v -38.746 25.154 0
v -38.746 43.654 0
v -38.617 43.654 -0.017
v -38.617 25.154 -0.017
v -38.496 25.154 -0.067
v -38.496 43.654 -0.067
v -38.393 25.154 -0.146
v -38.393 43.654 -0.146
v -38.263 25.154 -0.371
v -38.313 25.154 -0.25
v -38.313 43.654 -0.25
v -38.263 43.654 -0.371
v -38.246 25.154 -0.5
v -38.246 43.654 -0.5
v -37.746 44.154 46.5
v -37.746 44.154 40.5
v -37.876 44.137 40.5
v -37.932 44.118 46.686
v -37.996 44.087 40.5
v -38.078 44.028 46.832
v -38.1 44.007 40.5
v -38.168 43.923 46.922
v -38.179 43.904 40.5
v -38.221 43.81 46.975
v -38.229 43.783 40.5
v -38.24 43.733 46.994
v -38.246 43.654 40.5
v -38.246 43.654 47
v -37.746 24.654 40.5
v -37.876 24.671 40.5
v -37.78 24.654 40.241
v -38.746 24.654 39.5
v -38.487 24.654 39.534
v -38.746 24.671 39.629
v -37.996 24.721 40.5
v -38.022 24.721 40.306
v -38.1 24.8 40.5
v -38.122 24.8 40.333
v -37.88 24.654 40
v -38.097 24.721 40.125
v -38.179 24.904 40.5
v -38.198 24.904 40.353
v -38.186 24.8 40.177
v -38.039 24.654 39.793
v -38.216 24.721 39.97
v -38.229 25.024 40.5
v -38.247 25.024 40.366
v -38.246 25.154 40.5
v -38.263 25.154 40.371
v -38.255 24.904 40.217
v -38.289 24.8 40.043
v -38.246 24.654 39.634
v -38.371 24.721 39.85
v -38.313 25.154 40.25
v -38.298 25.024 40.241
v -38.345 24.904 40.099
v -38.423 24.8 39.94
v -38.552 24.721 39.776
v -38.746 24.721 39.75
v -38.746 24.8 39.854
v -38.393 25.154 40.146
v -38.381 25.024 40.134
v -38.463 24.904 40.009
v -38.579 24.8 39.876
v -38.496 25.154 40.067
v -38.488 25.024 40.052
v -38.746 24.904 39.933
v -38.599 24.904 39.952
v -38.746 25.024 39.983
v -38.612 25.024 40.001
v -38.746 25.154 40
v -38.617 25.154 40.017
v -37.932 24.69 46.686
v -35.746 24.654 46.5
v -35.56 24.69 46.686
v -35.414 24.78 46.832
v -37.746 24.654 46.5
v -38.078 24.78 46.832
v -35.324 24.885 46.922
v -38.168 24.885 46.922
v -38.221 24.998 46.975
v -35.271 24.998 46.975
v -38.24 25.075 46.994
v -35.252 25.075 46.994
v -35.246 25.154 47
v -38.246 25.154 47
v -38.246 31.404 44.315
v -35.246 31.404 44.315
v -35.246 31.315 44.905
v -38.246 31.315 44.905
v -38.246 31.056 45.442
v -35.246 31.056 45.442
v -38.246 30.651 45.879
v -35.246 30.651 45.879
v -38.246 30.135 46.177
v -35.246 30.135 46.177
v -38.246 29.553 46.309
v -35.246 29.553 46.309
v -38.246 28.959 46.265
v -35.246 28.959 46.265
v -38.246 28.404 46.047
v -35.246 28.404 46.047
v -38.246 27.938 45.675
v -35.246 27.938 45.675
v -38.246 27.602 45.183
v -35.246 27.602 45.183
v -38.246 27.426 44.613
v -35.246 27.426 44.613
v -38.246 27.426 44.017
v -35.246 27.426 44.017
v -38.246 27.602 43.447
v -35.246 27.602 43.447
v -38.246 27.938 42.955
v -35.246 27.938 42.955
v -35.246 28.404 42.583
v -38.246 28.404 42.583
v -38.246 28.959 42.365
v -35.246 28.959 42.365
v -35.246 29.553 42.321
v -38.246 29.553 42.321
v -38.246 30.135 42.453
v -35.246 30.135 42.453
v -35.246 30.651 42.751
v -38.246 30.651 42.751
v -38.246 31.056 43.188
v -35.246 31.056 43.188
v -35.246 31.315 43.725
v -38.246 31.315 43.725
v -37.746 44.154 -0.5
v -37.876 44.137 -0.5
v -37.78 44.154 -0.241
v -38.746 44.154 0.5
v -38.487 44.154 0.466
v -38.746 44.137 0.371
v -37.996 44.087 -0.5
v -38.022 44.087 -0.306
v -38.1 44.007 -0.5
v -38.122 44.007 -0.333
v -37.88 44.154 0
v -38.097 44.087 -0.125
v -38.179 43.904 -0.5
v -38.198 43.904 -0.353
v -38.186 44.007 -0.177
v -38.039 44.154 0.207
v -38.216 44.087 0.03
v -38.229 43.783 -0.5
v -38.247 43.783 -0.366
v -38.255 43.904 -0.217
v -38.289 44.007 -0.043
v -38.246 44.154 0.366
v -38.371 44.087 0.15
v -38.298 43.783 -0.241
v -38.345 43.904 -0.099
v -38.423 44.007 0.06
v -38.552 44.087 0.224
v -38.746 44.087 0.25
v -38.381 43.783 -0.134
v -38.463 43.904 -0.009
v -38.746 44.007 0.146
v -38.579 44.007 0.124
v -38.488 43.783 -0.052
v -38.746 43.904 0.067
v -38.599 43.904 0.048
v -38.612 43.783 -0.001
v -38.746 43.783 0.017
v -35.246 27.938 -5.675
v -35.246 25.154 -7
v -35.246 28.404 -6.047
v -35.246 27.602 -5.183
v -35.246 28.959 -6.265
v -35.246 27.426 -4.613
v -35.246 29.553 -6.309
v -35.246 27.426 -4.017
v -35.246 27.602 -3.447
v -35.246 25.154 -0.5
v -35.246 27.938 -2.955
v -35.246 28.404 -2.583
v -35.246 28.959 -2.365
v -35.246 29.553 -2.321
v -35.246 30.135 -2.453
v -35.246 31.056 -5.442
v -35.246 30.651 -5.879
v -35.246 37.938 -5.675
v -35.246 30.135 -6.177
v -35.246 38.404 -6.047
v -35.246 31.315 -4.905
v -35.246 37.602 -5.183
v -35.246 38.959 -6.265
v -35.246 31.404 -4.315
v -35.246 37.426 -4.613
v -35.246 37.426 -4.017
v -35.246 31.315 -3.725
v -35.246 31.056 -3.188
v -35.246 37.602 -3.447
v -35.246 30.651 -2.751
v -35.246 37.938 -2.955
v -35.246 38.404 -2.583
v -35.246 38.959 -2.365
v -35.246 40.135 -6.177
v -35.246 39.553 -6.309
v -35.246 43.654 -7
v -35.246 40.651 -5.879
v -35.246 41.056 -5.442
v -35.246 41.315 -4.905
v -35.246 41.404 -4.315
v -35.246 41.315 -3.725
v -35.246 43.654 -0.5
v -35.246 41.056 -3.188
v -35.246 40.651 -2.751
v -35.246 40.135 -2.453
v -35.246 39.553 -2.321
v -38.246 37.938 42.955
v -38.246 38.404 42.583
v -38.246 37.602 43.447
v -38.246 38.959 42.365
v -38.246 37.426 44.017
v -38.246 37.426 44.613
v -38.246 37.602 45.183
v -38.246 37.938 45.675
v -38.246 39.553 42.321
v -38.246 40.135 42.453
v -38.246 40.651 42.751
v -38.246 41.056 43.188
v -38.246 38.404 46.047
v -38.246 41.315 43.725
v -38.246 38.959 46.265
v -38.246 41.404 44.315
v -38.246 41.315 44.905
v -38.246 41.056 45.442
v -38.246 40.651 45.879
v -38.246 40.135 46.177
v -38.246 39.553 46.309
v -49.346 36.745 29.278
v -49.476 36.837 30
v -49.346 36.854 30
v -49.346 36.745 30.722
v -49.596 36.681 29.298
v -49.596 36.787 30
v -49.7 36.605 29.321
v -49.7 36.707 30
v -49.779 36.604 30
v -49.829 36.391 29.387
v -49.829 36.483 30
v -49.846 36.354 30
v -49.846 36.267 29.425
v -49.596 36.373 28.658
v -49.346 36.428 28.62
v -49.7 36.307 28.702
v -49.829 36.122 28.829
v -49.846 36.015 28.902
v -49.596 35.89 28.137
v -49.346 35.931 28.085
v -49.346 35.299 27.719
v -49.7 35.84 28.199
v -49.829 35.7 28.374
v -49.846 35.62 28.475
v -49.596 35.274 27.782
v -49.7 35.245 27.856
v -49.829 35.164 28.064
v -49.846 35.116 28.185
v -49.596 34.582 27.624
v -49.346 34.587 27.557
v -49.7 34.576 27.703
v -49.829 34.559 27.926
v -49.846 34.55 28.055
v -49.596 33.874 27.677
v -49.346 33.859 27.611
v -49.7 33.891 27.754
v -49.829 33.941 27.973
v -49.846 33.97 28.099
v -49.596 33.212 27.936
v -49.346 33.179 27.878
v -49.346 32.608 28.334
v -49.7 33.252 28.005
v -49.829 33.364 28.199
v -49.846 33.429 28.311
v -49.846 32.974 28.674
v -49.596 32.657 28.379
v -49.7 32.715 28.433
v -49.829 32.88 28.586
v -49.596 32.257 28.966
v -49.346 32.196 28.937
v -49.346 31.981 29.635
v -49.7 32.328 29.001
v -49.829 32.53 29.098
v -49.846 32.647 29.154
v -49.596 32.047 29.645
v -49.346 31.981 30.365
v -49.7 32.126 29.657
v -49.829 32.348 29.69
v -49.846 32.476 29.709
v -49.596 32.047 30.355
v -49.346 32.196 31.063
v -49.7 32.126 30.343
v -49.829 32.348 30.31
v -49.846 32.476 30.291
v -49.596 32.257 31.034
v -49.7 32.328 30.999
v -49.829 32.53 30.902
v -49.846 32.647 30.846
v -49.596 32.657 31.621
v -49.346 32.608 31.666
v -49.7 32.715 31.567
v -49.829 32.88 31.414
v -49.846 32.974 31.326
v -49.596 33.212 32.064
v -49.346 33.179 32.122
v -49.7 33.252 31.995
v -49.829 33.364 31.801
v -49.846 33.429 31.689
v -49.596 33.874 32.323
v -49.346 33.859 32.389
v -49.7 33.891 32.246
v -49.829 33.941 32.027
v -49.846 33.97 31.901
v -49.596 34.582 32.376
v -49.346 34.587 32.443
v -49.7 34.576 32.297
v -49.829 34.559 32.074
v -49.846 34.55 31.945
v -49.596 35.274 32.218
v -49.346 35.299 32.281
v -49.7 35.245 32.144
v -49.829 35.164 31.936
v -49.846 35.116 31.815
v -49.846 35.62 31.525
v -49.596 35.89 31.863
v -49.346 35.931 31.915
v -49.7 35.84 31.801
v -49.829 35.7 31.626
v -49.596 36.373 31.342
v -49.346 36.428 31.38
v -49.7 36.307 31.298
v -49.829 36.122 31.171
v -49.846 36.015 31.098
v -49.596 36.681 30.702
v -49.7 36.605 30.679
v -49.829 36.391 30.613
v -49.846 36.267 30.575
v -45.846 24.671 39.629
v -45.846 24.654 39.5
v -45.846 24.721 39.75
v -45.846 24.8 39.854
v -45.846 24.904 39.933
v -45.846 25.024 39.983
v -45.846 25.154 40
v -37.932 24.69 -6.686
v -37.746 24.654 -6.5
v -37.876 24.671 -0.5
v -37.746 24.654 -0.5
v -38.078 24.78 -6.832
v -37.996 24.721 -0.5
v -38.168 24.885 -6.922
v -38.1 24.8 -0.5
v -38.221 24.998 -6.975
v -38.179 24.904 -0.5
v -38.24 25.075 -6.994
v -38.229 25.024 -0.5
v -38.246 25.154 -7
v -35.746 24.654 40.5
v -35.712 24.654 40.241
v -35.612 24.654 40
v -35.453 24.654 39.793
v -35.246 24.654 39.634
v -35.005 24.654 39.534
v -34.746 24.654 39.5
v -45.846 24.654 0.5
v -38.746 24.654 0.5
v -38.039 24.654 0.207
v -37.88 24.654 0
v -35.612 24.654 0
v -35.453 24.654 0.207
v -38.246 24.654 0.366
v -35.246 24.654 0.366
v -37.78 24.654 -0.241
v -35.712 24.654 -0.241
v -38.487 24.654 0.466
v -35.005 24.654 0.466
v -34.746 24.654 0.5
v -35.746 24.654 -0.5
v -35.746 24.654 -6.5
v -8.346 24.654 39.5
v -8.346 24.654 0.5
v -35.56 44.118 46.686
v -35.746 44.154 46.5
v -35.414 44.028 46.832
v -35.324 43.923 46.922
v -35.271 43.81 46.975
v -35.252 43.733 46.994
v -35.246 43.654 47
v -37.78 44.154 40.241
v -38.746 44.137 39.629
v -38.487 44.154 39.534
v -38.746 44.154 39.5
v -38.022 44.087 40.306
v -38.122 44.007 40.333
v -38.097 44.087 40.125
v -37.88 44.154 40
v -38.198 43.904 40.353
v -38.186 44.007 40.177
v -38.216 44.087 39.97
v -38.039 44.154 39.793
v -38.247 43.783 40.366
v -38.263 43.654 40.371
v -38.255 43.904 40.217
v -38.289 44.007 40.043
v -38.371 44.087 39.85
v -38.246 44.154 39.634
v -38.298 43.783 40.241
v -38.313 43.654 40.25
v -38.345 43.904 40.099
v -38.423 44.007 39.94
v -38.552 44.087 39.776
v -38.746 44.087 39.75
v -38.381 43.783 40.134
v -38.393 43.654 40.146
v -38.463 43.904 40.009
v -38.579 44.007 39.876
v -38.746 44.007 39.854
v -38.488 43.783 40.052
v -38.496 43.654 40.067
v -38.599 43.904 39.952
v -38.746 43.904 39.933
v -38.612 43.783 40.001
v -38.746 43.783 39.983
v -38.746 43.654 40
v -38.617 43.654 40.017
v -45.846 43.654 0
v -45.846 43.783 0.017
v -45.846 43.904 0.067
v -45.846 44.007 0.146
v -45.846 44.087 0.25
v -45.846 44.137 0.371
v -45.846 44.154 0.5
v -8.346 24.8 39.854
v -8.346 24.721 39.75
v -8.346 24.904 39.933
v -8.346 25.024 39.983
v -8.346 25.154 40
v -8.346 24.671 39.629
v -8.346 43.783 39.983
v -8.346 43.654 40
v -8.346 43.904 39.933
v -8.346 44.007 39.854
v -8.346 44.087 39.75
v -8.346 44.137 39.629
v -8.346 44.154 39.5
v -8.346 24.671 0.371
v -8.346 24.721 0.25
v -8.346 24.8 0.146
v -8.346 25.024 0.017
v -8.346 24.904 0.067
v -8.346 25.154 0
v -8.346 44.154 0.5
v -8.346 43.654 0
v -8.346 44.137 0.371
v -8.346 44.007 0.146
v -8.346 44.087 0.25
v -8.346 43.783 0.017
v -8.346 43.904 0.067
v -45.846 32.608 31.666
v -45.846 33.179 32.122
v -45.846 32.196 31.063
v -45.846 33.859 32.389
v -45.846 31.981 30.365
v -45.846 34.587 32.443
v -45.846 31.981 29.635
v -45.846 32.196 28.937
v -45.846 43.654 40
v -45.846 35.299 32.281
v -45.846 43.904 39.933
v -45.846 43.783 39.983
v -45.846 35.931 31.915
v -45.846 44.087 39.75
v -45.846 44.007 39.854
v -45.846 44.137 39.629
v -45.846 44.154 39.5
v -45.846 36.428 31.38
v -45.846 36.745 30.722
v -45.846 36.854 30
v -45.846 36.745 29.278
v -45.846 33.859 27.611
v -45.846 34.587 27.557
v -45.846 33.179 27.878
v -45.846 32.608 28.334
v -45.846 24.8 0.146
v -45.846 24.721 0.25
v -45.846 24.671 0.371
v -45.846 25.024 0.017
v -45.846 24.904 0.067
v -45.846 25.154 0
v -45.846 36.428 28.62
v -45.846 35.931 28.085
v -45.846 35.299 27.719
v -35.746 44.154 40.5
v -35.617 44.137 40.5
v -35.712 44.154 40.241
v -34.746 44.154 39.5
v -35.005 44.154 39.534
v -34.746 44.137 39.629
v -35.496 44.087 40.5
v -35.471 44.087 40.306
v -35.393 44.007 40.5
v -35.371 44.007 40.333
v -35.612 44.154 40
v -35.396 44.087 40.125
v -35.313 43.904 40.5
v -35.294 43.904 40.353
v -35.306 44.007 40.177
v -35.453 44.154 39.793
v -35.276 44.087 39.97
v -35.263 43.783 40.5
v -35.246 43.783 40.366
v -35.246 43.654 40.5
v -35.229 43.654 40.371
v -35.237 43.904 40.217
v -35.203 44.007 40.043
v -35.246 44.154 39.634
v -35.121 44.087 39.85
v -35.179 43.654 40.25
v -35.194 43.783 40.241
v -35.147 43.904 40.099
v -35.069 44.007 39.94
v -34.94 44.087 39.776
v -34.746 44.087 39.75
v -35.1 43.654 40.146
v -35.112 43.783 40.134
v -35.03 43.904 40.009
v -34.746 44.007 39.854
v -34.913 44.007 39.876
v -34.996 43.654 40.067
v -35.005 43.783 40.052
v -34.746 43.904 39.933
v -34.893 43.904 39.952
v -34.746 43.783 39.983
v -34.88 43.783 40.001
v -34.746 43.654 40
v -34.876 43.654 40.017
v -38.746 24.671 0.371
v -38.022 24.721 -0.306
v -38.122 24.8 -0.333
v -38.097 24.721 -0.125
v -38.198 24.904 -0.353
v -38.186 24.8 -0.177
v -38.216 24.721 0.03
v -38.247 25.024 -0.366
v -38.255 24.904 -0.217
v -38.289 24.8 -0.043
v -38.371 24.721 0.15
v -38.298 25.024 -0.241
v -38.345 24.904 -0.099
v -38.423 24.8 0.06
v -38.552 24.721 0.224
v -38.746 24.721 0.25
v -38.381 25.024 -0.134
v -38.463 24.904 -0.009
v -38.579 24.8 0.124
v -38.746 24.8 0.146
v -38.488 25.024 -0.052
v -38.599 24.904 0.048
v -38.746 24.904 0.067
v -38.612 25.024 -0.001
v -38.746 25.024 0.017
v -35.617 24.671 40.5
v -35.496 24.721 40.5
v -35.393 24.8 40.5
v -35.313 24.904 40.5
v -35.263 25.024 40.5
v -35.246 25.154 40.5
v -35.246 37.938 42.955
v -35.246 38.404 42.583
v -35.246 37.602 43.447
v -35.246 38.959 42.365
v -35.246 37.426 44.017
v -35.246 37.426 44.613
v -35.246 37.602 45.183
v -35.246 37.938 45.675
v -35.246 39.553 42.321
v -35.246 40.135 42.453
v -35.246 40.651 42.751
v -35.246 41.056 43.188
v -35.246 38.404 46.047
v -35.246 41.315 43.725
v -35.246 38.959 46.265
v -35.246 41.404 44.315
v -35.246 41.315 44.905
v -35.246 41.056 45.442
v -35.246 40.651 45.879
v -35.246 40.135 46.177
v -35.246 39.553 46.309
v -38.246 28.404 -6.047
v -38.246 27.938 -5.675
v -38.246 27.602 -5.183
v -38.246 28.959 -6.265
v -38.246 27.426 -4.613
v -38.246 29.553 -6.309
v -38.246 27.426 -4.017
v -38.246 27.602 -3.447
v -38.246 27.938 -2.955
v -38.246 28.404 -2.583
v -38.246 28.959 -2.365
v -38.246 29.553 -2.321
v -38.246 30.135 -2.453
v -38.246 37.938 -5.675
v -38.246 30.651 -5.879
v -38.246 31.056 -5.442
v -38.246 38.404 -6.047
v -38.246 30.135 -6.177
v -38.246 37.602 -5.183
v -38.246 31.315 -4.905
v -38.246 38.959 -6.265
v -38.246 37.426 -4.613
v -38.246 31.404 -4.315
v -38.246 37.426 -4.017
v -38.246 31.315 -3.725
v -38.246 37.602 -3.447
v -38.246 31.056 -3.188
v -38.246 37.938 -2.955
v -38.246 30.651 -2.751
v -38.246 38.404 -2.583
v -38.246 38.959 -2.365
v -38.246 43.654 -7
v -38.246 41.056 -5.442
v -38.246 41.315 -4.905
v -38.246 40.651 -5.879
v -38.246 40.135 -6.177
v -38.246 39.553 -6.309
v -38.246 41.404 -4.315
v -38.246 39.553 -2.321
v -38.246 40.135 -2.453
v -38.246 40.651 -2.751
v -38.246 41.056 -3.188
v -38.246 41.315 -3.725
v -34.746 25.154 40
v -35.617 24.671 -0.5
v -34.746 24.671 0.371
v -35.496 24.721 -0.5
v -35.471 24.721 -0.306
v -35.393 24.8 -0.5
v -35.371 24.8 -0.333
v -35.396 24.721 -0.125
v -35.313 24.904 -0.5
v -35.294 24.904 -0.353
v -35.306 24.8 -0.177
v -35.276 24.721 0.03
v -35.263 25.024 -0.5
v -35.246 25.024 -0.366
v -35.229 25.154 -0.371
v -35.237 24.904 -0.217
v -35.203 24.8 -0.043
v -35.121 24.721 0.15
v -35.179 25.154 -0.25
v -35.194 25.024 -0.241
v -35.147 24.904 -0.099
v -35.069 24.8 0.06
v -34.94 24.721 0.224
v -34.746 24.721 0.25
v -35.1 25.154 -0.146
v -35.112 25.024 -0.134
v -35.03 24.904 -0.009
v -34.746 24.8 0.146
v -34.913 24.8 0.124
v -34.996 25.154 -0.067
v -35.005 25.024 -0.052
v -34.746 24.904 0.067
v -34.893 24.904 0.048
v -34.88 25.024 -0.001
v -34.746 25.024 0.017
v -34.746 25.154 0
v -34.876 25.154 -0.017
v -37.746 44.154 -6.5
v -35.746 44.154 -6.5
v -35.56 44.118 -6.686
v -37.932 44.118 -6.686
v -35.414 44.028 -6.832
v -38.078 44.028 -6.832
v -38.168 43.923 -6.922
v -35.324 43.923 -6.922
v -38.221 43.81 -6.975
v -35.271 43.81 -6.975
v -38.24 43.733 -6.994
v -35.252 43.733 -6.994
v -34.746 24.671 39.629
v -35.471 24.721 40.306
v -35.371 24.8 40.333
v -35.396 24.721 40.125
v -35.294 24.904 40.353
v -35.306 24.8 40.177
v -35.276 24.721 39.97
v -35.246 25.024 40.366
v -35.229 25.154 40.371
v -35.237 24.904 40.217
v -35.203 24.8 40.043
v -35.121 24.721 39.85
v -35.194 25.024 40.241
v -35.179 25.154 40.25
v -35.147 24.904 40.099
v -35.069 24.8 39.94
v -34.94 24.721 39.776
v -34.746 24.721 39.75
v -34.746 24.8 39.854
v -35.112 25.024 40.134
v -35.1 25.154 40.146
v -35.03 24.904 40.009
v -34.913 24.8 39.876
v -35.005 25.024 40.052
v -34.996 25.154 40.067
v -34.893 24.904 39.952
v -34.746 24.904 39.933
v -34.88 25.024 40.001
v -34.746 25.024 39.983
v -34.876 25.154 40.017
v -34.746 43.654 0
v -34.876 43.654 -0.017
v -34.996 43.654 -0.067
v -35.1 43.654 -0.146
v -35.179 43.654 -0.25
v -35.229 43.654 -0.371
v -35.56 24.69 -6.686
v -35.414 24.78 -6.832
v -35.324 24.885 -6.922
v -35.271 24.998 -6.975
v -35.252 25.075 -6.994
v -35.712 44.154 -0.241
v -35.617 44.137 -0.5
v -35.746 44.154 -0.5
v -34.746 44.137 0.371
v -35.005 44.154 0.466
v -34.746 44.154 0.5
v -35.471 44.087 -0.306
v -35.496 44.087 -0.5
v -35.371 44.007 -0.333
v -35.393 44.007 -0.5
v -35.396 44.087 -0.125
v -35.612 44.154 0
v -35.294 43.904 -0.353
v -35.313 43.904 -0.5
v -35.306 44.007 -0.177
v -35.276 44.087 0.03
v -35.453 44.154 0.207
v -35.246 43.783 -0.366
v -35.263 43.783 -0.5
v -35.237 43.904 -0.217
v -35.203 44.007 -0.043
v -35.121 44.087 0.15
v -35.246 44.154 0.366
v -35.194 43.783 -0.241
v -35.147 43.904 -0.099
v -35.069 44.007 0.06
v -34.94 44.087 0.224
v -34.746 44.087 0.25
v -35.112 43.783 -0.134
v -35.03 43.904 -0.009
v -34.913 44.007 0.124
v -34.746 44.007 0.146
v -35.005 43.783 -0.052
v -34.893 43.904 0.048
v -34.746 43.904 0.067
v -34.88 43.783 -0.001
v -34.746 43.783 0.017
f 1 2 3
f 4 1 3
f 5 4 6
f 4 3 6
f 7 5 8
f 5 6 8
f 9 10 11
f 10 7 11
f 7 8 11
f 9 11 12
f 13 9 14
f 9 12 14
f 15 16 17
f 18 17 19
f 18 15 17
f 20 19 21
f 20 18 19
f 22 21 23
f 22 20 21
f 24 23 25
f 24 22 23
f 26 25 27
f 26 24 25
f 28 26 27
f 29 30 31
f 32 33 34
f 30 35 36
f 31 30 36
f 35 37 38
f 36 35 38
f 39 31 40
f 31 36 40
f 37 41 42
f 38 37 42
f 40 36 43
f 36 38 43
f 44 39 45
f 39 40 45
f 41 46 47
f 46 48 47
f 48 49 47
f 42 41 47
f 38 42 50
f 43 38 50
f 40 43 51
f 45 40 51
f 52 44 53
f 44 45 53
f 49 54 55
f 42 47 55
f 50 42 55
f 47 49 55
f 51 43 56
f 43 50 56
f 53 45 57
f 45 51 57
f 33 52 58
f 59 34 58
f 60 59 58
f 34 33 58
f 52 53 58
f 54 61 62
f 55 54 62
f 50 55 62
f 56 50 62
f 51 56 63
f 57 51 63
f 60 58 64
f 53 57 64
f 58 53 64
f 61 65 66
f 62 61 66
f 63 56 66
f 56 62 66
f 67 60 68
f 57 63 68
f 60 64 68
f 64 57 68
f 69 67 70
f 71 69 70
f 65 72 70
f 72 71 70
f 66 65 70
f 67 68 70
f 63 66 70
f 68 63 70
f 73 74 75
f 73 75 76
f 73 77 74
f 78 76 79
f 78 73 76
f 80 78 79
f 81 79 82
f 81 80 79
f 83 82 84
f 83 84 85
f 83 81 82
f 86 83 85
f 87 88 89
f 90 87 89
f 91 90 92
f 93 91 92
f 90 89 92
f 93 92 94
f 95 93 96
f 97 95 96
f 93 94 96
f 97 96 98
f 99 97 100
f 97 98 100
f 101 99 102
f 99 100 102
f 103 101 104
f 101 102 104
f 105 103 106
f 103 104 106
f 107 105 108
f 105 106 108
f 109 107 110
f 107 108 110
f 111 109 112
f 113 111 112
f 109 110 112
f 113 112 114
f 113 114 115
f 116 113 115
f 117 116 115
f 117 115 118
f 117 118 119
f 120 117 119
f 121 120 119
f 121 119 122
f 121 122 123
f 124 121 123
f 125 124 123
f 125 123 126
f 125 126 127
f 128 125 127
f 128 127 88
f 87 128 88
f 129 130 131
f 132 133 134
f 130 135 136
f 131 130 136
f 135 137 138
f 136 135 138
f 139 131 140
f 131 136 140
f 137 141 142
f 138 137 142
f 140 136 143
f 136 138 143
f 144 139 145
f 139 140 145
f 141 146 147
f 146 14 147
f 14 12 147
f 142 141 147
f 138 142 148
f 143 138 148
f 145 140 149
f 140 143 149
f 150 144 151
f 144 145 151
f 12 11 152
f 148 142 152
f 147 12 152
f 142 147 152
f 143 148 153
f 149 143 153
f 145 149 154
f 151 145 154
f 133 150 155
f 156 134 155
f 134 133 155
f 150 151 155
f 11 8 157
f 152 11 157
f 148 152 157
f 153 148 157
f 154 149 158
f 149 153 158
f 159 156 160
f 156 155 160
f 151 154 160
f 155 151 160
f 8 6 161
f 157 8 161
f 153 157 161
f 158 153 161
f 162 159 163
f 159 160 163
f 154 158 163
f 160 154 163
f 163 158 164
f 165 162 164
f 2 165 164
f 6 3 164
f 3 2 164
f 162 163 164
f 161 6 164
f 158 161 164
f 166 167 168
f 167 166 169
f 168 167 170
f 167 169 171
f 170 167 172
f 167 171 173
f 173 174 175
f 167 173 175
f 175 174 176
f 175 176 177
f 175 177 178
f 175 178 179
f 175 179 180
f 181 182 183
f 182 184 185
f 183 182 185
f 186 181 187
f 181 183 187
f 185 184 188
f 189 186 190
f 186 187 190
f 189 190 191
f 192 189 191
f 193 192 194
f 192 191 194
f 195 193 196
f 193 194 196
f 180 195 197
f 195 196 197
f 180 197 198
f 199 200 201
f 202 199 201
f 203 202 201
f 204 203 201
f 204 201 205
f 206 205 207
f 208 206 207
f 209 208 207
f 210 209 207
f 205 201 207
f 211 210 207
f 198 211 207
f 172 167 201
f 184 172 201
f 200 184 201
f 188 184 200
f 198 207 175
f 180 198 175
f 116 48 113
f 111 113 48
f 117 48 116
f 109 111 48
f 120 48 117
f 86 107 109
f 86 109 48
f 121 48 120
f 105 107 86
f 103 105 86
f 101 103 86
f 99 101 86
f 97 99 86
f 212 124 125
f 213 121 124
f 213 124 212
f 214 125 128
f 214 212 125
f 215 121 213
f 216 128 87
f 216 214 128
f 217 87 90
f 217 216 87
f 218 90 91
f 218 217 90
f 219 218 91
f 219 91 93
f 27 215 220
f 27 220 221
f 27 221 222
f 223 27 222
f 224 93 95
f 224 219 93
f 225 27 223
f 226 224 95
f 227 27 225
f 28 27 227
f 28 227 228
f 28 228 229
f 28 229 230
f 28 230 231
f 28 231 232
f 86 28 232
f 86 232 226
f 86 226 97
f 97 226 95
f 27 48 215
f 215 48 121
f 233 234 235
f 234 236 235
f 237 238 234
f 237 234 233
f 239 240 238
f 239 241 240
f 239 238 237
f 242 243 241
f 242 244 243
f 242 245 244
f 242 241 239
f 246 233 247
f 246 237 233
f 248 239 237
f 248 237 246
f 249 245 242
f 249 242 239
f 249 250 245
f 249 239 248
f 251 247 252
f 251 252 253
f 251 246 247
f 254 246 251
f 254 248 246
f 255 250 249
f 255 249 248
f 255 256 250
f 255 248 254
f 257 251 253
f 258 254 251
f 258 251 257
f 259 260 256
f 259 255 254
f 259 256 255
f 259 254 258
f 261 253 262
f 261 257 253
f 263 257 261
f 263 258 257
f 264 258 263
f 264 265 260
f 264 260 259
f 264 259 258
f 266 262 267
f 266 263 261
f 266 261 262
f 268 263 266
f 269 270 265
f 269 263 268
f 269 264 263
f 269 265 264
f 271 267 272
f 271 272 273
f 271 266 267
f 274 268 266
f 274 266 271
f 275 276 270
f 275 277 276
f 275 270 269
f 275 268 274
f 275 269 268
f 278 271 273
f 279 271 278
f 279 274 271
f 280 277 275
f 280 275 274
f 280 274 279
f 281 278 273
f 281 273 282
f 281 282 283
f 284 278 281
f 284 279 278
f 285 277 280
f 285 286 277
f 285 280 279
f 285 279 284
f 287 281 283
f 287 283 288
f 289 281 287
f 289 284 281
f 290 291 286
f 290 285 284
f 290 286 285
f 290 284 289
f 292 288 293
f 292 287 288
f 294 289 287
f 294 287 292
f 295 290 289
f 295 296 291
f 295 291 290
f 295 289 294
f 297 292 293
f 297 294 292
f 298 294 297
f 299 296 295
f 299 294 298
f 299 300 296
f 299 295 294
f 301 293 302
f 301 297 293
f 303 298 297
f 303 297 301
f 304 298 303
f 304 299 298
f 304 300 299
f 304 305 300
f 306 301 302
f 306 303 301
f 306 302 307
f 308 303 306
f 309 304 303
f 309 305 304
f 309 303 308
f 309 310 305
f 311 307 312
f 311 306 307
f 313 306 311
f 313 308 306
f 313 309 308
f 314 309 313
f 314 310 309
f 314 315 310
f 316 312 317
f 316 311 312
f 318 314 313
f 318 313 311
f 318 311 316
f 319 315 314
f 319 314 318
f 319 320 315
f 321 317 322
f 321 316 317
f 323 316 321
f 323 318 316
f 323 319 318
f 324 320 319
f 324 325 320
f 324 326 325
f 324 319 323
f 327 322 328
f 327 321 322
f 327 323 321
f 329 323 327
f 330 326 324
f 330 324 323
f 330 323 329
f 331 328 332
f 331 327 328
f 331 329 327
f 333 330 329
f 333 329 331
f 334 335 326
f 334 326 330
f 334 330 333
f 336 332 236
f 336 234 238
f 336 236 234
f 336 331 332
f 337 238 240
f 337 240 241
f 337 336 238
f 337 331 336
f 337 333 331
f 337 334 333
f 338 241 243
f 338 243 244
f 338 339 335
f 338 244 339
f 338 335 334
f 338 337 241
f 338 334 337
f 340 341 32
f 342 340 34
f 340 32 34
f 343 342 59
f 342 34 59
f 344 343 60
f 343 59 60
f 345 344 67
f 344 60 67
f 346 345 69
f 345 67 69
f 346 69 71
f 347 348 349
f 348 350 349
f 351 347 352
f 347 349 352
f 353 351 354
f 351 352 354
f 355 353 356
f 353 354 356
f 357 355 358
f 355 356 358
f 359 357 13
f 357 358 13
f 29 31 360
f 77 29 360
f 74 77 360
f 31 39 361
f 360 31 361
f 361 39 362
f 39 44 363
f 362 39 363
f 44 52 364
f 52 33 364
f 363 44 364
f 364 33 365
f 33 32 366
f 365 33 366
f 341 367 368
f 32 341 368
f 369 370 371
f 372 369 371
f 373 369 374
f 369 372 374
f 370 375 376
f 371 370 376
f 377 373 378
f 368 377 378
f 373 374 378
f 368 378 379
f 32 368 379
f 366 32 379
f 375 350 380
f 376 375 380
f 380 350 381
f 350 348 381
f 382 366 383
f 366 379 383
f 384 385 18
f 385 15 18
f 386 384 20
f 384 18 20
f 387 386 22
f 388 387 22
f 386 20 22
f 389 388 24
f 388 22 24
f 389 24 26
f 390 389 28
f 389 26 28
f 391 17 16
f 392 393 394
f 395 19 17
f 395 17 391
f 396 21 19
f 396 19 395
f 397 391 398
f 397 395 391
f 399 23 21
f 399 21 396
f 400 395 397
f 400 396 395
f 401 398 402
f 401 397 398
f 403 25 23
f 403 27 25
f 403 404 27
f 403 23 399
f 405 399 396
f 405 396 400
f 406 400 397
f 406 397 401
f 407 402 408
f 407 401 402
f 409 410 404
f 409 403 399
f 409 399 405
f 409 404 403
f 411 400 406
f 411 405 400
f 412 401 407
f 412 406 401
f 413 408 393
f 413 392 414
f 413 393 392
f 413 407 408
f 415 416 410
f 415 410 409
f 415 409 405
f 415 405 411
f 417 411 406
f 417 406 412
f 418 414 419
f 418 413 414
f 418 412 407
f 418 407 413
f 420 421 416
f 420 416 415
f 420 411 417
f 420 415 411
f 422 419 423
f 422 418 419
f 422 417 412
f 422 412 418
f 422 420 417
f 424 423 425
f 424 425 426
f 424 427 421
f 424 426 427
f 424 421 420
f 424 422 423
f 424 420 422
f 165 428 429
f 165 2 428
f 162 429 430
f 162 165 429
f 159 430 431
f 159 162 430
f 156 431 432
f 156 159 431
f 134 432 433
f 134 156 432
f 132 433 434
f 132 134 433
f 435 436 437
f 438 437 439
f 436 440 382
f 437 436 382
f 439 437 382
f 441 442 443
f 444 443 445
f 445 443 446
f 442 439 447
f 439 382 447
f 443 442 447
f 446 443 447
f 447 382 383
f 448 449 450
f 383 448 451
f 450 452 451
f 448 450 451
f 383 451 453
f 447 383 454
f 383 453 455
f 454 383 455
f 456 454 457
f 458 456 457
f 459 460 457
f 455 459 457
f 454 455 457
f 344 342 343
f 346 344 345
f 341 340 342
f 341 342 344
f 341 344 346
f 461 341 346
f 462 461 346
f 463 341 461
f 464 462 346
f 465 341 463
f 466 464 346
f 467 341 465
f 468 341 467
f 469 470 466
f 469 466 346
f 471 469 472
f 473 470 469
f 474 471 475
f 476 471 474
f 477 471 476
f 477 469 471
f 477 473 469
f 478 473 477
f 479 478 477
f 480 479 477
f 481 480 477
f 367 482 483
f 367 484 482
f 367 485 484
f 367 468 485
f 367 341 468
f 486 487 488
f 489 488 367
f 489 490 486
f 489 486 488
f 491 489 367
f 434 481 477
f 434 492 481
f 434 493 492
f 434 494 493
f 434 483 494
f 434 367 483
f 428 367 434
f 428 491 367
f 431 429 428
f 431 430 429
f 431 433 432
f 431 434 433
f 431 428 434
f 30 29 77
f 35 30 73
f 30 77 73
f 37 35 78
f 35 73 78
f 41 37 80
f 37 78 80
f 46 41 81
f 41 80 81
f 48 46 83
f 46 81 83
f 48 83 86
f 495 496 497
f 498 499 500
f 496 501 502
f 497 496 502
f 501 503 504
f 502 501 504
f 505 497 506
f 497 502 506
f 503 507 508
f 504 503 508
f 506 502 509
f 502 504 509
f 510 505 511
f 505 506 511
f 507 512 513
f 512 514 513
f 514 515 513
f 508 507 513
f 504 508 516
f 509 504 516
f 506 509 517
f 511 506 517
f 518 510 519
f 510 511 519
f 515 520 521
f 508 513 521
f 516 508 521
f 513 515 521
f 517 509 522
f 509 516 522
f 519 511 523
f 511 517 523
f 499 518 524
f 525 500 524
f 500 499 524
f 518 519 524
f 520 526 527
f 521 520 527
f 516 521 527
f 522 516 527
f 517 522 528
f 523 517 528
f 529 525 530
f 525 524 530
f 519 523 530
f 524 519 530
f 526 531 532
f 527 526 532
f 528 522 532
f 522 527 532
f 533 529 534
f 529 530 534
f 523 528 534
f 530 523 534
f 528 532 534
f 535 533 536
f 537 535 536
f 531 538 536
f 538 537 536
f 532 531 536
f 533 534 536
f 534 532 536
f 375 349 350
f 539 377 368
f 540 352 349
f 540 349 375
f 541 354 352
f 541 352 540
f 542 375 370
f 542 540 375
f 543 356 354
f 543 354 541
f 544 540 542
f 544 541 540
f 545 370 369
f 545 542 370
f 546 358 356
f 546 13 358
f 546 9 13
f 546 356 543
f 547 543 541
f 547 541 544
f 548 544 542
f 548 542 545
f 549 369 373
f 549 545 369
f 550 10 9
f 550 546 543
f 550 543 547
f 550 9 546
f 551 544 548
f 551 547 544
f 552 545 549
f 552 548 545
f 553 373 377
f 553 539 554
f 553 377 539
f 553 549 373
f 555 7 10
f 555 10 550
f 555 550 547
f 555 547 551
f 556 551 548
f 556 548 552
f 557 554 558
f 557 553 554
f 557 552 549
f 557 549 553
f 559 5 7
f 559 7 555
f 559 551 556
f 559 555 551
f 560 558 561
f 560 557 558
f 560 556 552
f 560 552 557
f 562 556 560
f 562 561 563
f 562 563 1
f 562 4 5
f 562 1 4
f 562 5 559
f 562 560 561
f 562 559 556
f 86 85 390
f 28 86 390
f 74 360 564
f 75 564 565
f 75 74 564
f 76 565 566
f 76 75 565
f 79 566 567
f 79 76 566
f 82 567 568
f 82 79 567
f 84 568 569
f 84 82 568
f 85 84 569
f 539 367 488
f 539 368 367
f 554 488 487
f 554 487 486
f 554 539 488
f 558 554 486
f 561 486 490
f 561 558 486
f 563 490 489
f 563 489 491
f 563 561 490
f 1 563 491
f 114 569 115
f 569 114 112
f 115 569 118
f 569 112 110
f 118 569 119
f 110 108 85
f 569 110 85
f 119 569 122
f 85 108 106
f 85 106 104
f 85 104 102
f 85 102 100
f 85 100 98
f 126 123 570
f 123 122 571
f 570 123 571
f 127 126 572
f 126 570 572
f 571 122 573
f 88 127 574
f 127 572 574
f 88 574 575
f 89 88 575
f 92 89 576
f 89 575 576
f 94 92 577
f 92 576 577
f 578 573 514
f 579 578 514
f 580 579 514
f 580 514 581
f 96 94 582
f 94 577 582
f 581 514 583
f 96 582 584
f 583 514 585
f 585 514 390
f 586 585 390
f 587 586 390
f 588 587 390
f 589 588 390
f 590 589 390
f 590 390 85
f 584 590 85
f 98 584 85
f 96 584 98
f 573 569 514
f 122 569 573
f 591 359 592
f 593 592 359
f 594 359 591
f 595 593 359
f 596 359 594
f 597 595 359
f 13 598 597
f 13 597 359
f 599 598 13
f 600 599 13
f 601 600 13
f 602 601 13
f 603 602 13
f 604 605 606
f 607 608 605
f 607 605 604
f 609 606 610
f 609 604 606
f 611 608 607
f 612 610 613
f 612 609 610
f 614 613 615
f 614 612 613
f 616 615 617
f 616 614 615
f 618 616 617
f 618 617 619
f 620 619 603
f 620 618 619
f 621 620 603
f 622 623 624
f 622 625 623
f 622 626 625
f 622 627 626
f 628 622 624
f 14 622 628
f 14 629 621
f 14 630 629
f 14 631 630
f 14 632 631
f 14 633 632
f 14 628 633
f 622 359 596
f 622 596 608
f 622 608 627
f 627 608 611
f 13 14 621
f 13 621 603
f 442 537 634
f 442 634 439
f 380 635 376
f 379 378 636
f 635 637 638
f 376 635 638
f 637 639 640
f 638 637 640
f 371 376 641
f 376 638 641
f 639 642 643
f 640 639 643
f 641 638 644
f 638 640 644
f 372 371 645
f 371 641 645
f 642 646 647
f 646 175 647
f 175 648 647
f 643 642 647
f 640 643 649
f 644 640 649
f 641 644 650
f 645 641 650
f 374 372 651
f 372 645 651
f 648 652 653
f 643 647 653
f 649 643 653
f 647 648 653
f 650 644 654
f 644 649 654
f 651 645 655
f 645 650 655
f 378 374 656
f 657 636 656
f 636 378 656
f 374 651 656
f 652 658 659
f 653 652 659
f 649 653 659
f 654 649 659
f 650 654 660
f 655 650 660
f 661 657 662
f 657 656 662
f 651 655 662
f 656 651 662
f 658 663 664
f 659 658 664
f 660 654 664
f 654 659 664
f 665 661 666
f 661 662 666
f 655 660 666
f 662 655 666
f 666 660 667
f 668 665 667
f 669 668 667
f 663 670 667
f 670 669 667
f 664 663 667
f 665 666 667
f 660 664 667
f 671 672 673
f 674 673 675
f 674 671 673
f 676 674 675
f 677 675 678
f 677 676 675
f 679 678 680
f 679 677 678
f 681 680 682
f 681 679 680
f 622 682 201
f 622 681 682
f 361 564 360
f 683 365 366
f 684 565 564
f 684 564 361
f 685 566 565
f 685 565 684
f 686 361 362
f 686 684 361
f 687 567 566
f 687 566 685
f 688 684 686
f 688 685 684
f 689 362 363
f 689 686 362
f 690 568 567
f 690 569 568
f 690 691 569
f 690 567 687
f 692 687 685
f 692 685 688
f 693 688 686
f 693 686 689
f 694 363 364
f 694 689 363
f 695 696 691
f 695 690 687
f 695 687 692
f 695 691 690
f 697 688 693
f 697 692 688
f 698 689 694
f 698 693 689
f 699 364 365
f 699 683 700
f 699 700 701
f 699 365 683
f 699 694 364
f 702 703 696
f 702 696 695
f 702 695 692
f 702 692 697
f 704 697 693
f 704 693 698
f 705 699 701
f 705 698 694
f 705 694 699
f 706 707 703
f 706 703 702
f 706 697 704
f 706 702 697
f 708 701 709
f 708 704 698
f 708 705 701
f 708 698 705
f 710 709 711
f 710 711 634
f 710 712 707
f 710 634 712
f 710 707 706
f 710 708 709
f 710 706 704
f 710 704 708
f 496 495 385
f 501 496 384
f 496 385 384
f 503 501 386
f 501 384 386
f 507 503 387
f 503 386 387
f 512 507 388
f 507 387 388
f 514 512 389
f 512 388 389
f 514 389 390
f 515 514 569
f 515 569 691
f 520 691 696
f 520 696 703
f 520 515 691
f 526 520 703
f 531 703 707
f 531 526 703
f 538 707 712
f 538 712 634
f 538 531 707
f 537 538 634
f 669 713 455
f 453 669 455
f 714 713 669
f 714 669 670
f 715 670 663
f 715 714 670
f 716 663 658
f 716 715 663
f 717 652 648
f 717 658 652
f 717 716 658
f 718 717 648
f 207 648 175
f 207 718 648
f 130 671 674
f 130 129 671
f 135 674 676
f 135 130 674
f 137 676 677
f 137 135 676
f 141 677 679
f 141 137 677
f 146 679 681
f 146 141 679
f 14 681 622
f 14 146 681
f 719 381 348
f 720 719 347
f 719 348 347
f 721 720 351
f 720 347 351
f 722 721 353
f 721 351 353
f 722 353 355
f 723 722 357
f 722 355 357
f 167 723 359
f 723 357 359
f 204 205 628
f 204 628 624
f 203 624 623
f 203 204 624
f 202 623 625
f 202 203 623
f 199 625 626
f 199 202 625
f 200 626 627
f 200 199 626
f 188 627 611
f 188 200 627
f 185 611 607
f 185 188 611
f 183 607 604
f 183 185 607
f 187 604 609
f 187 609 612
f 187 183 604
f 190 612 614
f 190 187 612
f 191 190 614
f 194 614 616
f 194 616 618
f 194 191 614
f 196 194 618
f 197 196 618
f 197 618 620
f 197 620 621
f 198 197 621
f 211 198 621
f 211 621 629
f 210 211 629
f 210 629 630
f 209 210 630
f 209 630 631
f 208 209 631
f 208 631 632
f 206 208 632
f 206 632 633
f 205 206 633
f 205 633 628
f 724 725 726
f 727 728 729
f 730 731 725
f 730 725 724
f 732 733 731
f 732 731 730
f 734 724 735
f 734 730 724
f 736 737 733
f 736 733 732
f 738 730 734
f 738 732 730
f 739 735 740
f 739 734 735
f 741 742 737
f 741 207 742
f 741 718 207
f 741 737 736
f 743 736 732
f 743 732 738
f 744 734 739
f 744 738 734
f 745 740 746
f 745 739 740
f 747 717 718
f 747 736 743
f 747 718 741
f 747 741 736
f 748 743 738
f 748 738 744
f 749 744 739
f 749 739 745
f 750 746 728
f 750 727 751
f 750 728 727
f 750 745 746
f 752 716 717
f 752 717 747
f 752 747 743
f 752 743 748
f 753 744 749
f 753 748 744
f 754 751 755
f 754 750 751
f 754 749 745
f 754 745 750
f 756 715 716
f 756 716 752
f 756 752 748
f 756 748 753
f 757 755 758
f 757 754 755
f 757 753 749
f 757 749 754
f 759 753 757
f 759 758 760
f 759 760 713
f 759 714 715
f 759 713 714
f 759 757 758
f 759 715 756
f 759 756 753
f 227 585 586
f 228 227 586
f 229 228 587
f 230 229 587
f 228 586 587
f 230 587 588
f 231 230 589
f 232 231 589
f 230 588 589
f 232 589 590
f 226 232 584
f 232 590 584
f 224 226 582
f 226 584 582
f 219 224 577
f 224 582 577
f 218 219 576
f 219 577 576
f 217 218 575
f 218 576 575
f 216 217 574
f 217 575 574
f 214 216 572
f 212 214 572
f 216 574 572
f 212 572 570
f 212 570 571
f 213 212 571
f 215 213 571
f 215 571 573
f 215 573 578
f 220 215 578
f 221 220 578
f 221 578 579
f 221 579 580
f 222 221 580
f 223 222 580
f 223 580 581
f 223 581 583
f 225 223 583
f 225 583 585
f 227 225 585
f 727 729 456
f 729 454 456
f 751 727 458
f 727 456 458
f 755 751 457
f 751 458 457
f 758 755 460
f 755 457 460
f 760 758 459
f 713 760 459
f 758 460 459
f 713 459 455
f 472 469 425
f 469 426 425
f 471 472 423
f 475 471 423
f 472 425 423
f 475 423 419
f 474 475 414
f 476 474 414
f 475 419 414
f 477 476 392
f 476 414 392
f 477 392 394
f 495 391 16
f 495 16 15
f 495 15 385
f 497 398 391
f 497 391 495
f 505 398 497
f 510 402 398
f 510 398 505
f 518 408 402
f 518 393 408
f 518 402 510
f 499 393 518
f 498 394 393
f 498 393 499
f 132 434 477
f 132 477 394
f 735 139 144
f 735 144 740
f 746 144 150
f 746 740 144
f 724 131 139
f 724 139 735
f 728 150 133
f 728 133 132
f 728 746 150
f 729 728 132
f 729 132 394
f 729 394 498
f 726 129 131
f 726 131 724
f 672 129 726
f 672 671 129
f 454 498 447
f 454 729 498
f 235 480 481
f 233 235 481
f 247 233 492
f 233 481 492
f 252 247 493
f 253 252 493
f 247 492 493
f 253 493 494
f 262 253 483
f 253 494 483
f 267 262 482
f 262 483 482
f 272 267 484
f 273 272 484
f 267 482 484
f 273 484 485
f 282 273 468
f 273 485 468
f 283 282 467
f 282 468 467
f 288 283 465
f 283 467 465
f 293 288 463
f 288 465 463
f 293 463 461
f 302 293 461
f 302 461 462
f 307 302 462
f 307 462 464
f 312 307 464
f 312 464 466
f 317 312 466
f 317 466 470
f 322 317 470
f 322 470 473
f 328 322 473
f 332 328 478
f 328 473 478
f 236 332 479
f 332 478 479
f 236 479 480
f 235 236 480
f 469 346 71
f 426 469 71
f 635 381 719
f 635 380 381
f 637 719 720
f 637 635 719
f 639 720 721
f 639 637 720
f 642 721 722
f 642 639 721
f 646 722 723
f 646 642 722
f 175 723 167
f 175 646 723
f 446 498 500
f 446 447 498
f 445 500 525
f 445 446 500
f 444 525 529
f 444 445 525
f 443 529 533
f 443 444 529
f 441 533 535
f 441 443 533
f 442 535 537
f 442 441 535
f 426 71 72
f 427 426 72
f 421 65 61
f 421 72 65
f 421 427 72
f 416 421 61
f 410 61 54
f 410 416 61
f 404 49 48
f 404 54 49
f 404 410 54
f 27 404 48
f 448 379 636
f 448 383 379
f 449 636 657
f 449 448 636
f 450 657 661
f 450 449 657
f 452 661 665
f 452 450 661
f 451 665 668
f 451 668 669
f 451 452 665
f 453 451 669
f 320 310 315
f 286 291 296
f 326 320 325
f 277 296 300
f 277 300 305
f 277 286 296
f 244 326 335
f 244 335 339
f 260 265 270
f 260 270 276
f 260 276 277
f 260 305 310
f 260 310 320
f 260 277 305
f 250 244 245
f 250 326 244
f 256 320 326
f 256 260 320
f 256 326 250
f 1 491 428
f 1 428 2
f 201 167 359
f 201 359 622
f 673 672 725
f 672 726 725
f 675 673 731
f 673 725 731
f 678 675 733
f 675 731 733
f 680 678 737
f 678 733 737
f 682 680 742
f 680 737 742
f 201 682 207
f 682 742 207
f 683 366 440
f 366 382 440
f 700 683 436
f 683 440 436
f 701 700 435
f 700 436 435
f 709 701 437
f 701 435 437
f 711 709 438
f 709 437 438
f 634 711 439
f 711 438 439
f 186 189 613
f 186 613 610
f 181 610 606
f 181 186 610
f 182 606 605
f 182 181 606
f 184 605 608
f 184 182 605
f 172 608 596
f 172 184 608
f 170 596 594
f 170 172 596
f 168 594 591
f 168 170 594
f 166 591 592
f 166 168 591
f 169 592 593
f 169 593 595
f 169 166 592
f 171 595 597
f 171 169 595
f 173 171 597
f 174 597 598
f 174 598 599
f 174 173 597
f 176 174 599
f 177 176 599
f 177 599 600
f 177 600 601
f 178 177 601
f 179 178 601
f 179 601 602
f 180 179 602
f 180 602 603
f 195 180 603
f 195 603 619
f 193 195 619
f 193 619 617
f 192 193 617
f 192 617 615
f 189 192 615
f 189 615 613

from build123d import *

# Parameters (mm, degrees)
SKETCH_1_W          = 37.5
SKETCH_1_H          = 19.5
EXTRUDE_1_DEPTH     = 40
SKETCH_2_W          = 7
SKETCH_2_H          = 19.5
EXTRUDE_2_DEPTH     = 3
CUT_EXTRUDE_START   = -70.872542033
SKETCH_3_R          = 2
CUT_EXTRUDE_5_DEPTH = 73.872542033
SKETCH_4_R          = 2.45
EXTRUDE_3_DEPTH     = 4
FILLET_1_R          = 0.5


with BuildPart() as part:
    # 草图1 → 凸台-拉伸1 (new body)
    with BuildSketch(Plane.XY):
        with Locations((-27.096153846, 34.403846154)):
            Rectangle(SKETCH_1_W, SKETCH_1_H)
    extrude(amount=EXTRUDE_1_DEPTH)

    # 草图2 → 凸台-拉伸2 (add)
    with BuildSketch(Plane.ZY.offset(35.246153846)):
        with Locations((-3.5, 34.403846154)):
            Rectangle(SKETCH_2_W, SKETCH_2_H)
        with Locations((43.5, 34.403846154)):
            Rectangle(SKETCH_2_W, SKETCH_2_H)
    extrude(amount=EXTRUDE_2_DEPTH)

    # 草图3 → 切除-拉伸5 (cut)
    with BuildSketch(Plane.ZY.offset(35.246153846).offset(CUT_EXTRUDE_START)):
        with Locations((-4.315, 39.403846154)):
            Circle(SKETCH_3_R)
        with Locations((-4.315, 29.403846154)):
            Circle(SKETCH_3_R)
    cut_extrude_5 = extrude(amount=CUT_EXTRUDE_5_DEPTH, mode=Mode.SUBTRACT)

    # 草图4 → 凸台-拉伸3 (add)
    with BuildSketch(Plane.ZY.offset(45.846153846)):
        with Locations((30, 34.403846154)):
            Circle(SKETCH_4_R)
    extrude(amount=EXTRUDE_3_DEPTH)

    # 圆角1
    fillet_1_edges = [part.edges().sort_by_distance(p)[0] for p in [
        (-42.046153846, 44.153846154, 40),
        (-42.046153846, 24.653846154, 40),
        (-42.046153846, 24.653846154, 0),
        (-42.046153846, 44.153846154, 0),
        (-49.846153846, 34.403846154, 27.55),
        (-35.246153846, 34.403846154, 40),
        (-35.246153846, 24.653846154, 43.5),
        (-35.246153846, 44.153846154, 43.5),
        (-38.246153846, 34.403846154, 40),
        (-38.246153846, 24.653846154, 43.5),
        (-38.246153846, 44.153846154, 43.5),
        (-36.746153846, 44.153846154, 47),
        (-35.246153846, 34.403846154, 0),
        (-35.246153846, 44.153846154, -3.5),
        (-35.246153846, 24.653846154, -3.5),
        (-38.246153846, 34.403846154, 0),
        (-38.246153846, 44.153846154, -3.5),
        (-38.246153846, 24.653846154, -3.5),
        (-36.746153846, 24.653846154, -7),
        (-36.746153846, 44.153846154, -7),
        (-36.746153846, 24.653846154, 47),
        (-21.796153846, 24.653846154, 0),
        (-21.796153846, 44.153846154, 40),
        (-21.796153846, 44.153846154, 0),
        (-21.796153846, 24.653846154, 40),
    ]]
    fillet(fillet_1_edges, radius=FILLET_1_R)

    # 镜向1: 切除-拉伸5 across plane
    add(cut_extrude_5.mirror(Plane(origin=(0, 0, 20), x_dir=(1, 0, 0), z_dir=(0, 0, -1))), mode=Mode.SUBTRACT)


solid = part.part
